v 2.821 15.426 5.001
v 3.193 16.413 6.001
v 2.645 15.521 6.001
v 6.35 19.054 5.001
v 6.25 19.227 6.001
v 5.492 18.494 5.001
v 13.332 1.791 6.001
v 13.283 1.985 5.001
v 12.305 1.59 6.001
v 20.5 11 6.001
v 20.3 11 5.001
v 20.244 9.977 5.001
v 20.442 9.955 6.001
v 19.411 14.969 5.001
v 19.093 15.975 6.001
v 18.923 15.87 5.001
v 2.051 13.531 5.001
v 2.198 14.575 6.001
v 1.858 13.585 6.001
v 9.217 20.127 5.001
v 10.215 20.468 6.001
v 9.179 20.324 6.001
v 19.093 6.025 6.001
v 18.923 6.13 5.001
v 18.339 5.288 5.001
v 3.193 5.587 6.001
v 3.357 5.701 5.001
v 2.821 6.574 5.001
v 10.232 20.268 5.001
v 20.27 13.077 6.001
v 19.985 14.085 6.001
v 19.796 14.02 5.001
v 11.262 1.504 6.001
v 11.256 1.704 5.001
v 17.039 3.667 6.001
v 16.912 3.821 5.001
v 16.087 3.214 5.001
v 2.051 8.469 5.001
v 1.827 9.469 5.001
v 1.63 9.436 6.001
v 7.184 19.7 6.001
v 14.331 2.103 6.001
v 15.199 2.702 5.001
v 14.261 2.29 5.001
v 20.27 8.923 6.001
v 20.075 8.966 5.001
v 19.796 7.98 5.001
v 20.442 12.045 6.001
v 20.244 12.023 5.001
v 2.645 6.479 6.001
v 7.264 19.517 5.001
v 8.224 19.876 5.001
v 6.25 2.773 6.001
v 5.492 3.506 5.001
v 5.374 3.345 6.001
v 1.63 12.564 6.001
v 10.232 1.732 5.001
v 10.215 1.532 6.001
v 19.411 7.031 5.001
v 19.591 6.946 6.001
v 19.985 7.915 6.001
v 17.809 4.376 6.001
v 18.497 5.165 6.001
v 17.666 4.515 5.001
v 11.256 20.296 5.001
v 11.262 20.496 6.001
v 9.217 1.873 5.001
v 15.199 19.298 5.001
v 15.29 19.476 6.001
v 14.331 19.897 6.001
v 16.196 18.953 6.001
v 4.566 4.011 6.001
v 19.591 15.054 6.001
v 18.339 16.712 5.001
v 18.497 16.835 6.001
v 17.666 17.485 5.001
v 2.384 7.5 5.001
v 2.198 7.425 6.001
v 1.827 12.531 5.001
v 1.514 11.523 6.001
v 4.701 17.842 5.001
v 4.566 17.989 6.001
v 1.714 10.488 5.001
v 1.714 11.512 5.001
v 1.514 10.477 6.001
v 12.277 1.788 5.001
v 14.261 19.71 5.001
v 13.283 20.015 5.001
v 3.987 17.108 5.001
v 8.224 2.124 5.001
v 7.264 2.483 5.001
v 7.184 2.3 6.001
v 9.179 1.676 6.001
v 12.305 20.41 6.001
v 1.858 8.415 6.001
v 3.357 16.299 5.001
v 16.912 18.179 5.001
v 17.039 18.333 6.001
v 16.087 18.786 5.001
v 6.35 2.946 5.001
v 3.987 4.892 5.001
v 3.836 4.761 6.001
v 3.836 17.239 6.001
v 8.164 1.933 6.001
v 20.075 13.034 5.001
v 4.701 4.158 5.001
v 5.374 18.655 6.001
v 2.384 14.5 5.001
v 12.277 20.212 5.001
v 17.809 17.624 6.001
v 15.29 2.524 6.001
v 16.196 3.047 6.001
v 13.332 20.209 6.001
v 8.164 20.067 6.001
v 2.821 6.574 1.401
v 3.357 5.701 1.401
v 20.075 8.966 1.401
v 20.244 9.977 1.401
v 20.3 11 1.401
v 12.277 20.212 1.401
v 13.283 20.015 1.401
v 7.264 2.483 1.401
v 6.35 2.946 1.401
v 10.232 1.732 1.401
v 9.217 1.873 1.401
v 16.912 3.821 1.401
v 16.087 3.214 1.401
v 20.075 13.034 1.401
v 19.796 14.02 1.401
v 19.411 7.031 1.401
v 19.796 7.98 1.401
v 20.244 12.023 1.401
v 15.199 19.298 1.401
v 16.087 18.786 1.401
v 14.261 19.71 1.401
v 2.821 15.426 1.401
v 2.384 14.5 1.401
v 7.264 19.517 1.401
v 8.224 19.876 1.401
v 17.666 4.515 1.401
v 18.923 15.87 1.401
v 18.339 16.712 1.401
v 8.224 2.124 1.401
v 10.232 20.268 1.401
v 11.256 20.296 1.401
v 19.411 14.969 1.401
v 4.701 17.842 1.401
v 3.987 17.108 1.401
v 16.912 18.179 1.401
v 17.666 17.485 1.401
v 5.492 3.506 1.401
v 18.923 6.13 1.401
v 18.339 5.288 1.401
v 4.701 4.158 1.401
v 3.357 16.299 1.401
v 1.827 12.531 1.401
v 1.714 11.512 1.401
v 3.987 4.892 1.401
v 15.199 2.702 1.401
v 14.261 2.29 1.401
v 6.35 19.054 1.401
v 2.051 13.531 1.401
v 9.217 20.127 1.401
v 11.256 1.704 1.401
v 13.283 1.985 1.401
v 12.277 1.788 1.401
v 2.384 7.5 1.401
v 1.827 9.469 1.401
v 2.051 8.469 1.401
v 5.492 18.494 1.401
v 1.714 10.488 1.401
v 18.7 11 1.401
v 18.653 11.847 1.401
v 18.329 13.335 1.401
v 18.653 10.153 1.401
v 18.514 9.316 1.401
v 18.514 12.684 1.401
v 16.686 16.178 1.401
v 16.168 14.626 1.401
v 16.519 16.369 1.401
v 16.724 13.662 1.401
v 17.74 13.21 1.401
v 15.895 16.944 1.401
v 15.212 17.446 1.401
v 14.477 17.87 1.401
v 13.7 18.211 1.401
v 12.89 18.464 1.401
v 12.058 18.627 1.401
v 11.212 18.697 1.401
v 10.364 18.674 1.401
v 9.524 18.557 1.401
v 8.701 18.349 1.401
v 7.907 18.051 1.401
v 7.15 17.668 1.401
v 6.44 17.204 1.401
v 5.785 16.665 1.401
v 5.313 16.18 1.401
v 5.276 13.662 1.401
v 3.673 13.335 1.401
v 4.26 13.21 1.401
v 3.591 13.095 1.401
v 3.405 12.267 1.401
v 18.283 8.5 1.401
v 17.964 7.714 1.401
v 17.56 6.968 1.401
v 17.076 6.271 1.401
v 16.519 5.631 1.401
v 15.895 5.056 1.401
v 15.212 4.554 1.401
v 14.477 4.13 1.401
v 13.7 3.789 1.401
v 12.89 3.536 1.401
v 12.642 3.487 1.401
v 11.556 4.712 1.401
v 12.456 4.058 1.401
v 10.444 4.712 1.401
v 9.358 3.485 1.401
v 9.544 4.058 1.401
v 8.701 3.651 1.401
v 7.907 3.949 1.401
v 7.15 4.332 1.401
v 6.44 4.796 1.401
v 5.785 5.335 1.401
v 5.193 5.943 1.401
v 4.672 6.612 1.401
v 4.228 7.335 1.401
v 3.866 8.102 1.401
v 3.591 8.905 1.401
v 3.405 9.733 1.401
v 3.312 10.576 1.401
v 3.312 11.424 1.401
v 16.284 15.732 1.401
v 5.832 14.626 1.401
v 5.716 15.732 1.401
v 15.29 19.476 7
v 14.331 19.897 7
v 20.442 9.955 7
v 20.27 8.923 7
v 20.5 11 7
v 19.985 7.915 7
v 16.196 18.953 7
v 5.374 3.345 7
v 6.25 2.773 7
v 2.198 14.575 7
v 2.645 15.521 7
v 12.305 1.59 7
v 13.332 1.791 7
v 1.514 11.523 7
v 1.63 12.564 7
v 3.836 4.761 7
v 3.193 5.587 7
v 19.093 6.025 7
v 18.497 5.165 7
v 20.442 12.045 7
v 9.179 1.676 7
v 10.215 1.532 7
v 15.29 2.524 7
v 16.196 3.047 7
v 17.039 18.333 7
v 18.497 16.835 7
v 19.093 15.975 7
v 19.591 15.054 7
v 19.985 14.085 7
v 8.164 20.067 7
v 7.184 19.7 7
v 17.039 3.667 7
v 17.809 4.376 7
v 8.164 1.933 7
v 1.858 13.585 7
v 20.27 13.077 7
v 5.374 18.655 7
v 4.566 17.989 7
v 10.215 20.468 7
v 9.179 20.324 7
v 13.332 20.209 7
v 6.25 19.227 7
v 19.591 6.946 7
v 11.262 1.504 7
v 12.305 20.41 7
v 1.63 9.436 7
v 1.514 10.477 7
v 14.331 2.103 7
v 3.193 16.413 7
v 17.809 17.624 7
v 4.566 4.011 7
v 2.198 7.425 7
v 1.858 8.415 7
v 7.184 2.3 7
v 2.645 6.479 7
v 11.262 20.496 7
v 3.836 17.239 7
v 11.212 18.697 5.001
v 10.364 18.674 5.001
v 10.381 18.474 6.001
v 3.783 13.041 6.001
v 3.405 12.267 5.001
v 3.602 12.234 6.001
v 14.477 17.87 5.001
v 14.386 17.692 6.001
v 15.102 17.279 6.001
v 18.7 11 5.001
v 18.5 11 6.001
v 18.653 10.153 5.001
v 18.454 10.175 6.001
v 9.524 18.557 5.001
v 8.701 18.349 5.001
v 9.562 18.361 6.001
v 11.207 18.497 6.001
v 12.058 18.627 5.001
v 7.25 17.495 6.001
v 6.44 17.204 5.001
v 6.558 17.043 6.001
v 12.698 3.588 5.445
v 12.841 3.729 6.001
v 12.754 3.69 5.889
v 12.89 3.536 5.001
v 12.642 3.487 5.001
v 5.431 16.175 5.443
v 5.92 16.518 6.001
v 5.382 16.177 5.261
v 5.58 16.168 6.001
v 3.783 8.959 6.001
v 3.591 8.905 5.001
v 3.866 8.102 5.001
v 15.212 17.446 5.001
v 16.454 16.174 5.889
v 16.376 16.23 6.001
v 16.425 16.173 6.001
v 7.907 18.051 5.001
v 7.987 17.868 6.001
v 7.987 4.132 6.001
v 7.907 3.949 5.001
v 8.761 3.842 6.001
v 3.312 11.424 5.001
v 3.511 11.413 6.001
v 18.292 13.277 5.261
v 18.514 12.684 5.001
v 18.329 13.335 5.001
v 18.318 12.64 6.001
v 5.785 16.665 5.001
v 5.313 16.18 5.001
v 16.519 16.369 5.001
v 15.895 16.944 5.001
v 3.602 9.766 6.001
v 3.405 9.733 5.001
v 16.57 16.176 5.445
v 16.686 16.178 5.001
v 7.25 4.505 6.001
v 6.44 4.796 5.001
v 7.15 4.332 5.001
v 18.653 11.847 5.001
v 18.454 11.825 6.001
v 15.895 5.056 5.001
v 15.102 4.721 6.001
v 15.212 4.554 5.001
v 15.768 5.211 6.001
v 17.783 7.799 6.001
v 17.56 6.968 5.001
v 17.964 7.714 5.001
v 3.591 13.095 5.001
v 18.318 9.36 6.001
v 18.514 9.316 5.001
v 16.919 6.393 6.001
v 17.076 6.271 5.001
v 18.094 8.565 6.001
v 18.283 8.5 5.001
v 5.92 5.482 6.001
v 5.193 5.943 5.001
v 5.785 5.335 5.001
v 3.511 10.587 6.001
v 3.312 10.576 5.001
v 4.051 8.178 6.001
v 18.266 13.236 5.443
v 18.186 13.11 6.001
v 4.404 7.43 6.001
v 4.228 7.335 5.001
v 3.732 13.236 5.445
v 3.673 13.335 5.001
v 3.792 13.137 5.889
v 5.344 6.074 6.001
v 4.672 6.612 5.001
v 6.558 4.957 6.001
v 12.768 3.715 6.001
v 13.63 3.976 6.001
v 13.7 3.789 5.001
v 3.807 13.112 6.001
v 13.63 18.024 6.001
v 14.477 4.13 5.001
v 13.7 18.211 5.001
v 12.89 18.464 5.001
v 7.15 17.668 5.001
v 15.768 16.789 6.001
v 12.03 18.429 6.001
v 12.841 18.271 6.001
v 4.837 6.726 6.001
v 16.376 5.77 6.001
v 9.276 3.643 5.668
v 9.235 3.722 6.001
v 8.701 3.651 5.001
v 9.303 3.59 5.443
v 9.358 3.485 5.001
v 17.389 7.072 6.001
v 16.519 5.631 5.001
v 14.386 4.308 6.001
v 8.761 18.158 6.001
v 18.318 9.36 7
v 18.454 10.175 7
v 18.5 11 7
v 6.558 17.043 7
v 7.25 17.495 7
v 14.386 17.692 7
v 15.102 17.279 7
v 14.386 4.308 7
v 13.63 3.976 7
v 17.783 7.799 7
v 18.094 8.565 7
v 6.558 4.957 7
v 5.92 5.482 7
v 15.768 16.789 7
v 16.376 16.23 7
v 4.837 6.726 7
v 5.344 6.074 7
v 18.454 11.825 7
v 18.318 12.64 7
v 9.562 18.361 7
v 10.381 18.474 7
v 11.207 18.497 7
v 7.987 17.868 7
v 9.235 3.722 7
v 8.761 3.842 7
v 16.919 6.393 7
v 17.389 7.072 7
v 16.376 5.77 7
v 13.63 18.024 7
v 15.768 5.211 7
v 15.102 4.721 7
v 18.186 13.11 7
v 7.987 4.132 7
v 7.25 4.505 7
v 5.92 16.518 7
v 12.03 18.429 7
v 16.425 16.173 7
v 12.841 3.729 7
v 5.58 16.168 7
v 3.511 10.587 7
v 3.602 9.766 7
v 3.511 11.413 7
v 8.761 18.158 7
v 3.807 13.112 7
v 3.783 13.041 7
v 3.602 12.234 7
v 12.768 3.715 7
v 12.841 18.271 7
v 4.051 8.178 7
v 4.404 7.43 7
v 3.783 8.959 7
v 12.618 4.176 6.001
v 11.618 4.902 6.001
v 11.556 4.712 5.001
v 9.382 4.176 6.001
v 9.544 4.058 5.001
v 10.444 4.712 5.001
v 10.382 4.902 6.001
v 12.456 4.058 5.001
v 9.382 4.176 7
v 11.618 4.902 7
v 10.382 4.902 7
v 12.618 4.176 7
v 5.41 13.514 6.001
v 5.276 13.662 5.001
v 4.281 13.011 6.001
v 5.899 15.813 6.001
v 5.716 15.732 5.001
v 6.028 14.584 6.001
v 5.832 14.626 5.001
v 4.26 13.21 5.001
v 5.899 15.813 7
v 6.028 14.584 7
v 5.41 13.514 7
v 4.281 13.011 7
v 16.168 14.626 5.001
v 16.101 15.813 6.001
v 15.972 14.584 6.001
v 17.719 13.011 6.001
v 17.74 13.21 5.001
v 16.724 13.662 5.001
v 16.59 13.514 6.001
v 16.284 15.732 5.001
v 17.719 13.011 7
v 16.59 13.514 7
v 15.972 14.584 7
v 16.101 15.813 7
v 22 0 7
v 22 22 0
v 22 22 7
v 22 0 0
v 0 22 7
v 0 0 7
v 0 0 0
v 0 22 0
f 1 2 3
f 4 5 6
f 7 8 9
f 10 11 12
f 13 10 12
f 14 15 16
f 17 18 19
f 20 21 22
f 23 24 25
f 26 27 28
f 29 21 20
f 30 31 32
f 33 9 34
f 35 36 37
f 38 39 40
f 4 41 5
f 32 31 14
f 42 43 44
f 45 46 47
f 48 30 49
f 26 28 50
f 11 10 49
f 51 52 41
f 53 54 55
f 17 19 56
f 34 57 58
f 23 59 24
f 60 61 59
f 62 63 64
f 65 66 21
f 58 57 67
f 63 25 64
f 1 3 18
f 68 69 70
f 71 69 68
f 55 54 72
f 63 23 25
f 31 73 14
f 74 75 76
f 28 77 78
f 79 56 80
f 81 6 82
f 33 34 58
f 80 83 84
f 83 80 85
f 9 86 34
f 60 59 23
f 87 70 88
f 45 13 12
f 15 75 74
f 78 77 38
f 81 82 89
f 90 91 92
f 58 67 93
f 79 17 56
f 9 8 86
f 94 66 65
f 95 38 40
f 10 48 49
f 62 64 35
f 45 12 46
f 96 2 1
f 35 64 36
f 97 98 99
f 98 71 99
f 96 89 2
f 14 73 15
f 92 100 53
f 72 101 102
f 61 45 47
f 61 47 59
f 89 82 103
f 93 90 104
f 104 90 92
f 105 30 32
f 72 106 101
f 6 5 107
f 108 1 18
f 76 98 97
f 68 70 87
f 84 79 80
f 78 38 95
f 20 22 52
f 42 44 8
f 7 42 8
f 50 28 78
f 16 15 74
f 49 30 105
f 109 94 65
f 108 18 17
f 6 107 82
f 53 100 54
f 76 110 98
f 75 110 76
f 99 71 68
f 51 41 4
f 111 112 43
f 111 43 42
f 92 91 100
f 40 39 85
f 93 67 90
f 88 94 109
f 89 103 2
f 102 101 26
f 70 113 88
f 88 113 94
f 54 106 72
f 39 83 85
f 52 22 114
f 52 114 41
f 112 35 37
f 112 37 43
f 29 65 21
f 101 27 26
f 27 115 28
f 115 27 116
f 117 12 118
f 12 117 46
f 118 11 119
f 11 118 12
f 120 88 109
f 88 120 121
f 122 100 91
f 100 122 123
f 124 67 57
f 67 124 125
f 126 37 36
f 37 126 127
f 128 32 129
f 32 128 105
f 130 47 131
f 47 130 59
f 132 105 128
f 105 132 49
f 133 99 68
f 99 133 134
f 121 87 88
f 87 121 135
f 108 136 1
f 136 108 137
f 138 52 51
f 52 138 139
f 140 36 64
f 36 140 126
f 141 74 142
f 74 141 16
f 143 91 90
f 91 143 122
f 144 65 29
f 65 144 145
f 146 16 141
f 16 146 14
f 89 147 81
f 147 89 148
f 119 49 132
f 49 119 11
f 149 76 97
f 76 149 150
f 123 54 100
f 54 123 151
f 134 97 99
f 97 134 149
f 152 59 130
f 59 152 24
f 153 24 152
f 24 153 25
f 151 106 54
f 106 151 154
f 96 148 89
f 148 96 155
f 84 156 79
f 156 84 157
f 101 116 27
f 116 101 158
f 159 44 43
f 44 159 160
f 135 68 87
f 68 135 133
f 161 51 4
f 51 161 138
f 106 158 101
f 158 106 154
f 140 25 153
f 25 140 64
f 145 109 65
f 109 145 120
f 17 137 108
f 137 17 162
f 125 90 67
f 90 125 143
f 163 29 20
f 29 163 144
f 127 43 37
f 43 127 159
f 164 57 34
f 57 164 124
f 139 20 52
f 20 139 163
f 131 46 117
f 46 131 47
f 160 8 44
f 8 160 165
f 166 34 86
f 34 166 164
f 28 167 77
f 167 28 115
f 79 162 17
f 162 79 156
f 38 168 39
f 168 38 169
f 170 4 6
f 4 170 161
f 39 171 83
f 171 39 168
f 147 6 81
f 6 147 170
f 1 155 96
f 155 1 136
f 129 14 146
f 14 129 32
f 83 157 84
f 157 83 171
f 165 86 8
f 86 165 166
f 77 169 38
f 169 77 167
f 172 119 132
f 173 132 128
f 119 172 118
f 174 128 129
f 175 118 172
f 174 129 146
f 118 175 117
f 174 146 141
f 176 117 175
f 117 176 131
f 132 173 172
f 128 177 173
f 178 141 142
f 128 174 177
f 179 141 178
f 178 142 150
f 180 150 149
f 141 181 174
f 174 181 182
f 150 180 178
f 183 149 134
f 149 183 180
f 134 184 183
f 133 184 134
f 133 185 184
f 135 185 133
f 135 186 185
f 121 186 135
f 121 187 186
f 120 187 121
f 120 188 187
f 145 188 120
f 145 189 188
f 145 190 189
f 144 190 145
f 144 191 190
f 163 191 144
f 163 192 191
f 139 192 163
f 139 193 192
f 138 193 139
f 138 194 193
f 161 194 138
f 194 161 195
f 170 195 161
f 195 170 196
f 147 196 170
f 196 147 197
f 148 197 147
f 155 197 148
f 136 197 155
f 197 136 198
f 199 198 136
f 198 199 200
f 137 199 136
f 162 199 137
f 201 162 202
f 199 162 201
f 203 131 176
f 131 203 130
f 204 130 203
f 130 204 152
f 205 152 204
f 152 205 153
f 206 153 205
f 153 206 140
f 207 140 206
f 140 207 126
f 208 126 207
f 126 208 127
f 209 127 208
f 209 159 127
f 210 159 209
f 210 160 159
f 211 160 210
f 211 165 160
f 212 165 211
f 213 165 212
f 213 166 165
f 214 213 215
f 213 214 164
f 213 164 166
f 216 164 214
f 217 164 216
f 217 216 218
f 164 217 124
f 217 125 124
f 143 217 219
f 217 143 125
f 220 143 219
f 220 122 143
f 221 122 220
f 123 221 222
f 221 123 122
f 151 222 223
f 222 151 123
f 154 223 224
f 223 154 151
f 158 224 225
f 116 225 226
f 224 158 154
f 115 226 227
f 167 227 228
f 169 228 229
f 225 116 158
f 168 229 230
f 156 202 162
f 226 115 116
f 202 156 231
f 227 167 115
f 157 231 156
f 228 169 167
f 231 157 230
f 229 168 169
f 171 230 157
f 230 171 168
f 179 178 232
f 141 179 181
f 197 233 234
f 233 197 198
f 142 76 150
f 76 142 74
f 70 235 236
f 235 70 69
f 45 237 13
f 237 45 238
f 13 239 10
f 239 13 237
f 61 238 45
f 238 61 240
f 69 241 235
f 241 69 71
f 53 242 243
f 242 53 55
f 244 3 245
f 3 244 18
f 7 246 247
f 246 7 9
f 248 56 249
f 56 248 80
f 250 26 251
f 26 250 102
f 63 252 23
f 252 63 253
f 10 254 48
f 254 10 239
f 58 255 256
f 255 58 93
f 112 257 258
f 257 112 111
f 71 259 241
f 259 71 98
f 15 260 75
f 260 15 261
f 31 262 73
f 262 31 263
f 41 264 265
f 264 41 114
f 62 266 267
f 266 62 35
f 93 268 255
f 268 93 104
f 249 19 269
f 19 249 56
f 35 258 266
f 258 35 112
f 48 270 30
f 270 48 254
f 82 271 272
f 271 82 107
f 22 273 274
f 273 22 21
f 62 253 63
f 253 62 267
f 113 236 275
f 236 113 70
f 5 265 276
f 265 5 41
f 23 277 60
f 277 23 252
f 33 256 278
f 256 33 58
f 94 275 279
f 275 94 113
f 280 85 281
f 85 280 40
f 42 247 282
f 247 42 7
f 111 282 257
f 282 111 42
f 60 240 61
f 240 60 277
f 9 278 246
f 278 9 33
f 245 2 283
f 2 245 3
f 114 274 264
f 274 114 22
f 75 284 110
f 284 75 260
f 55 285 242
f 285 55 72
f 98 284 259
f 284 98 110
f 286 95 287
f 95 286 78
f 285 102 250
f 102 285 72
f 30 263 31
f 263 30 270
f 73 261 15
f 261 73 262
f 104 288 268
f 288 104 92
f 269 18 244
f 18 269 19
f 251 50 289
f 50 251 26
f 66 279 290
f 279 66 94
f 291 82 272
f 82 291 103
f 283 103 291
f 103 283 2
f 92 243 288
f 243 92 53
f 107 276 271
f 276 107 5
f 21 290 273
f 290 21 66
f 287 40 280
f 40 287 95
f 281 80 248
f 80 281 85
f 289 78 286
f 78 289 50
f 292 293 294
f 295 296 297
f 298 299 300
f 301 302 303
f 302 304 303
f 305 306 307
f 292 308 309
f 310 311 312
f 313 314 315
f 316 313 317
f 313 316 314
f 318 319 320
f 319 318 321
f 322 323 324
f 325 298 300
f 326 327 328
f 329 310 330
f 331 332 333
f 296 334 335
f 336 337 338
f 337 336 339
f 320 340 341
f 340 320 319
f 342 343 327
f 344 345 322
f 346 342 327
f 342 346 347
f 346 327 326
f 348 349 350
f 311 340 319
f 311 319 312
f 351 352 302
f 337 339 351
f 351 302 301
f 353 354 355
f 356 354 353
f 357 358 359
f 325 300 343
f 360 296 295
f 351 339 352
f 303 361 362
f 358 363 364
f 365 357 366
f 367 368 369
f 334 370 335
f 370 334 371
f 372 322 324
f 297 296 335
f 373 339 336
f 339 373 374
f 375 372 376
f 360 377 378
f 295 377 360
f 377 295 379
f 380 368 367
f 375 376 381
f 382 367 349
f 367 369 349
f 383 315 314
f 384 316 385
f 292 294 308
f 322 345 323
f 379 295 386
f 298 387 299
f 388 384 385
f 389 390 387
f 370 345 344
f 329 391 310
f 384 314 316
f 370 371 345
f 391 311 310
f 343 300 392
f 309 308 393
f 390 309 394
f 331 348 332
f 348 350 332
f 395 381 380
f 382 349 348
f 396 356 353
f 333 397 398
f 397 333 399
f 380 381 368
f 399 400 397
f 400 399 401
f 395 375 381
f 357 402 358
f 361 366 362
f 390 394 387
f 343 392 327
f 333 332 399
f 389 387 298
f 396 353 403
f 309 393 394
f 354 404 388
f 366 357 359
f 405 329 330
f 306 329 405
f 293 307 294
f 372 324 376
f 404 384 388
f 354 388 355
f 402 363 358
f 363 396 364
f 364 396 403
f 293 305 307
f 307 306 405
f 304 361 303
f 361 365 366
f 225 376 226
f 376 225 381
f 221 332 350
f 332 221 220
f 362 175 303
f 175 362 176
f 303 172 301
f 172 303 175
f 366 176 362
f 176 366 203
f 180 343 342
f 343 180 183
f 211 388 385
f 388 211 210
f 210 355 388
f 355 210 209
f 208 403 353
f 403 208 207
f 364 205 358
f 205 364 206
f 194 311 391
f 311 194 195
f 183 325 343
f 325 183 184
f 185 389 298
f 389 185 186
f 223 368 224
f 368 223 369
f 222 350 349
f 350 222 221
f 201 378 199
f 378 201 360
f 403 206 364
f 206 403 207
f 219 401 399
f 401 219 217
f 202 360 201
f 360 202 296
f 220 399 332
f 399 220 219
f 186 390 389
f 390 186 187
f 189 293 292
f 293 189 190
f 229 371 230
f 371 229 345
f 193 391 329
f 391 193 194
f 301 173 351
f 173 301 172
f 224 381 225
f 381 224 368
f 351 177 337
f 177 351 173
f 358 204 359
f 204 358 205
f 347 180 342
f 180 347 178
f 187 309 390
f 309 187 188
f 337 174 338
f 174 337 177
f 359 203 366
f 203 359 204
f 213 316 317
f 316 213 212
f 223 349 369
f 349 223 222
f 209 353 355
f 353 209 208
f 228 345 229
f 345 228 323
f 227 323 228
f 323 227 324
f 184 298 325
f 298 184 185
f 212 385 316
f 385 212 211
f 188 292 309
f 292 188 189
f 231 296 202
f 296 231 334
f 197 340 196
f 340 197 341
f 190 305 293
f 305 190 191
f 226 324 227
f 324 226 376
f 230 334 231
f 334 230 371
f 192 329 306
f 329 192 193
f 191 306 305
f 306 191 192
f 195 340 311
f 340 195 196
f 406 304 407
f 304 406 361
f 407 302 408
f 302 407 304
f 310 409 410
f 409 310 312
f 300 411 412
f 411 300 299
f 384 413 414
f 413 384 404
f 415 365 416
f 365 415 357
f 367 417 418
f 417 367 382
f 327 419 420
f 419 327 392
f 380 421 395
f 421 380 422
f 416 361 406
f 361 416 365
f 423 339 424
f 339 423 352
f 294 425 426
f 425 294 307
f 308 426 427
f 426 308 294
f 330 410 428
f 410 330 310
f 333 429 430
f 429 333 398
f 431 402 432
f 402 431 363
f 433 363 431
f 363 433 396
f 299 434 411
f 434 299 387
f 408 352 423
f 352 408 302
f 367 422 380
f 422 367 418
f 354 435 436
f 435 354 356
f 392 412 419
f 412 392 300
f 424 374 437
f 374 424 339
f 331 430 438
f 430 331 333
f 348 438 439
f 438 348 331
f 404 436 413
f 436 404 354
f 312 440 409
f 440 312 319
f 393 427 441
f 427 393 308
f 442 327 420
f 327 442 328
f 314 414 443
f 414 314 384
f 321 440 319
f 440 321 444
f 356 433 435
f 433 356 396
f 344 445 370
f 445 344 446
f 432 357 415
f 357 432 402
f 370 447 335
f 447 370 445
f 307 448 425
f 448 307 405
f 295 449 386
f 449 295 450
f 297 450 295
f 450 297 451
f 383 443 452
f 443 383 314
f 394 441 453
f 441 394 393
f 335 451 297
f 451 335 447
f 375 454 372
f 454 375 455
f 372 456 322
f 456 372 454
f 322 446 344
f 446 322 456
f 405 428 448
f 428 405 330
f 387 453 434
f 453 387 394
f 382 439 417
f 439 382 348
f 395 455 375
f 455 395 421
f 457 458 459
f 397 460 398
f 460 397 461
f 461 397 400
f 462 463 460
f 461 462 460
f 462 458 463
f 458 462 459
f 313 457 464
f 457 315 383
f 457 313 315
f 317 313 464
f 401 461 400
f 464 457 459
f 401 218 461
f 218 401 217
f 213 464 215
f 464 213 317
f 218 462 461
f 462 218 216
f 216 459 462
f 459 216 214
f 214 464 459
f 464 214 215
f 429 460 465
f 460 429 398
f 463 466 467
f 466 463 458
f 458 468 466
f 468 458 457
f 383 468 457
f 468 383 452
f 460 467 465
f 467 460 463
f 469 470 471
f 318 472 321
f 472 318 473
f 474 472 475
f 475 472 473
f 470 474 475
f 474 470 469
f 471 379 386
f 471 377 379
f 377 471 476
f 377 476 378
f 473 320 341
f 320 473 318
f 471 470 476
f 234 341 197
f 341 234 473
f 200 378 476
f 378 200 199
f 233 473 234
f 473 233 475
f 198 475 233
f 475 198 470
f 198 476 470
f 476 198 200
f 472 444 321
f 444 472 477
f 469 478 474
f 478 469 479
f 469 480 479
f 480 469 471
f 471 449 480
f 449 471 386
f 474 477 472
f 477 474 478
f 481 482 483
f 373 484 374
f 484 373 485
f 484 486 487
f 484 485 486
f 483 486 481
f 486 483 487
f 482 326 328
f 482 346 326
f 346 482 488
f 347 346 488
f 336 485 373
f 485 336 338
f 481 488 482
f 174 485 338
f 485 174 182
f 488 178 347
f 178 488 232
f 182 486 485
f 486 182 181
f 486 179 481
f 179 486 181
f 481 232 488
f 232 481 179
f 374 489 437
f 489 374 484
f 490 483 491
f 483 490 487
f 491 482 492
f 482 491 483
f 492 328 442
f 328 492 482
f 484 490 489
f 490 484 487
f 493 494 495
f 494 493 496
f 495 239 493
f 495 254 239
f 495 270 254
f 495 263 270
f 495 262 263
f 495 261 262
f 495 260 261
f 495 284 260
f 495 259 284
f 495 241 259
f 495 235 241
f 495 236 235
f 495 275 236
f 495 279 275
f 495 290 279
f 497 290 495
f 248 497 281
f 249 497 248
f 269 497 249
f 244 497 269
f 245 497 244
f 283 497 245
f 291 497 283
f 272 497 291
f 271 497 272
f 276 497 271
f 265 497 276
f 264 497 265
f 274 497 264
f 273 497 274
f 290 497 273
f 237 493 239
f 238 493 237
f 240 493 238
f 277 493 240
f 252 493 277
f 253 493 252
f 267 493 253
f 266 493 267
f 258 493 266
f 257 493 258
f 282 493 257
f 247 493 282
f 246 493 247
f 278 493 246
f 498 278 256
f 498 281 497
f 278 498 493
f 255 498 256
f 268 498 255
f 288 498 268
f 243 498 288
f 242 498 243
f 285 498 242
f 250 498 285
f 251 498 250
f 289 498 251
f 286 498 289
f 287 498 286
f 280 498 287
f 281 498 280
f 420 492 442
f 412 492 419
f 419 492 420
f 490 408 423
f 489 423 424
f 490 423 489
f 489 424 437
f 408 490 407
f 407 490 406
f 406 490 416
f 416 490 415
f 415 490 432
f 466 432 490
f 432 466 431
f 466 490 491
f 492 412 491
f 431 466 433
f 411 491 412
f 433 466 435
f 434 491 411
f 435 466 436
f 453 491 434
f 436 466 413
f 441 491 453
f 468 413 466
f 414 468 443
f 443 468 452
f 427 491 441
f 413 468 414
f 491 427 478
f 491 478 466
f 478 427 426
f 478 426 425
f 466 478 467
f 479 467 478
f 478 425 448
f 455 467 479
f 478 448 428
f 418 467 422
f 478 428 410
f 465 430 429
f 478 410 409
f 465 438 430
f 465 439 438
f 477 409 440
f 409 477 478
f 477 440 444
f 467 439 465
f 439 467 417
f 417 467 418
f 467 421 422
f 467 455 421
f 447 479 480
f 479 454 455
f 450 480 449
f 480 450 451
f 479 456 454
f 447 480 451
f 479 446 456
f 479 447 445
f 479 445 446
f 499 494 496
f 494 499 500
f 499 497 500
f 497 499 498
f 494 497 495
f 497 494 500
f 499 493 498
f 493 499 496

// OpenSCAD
// file: constants.scad
connectors_notched_circle_thickness = 2;
connectors_notched_circle_notch_diameter = 3;
connectors_notched_circle_loose_length = 1;
connectors_notched_circle_loose_to_tight_length = 1;
// file: ../../utilities/cylinders.scad
// Calculates the $fn which should be used for a cylinder of a specific size.
function cylinder_sides(
  // The diameter of the cylinder.
  diameter
) = ceil(
  max(
    min(
      360 / $fa,
      diameter * PI / $fs
    ),
    8
  )
);

// Generates a grid of square perforations through a cylinder of a specific
// size.
module cylinder_perforations(
  // The diameter of the cylinder.
  diameter,
  // The height of the cylinder.
  length,
  // The size (width/height) of each perforation.
  perforation_size,
  // The target spacing between perforations.  This will be adjusted to fit
  // evenly on the cylinder.
  perforation_spacing
) {
  half_perimeter = diameter * PI / 2;
  angularPerforations = round(half_perimeter / perforation_spacing);
  zPerforations = round(half_perimeter / perforation_spacing);
  for (angle = [0:180 / angularPerforations:180]) {
    rotate([0, 0, angle]) {
      for (z = [perforation_spacing:perforation_spacing:length - perforation_spacing]) {
        translate([0, 0, z]) {
          cube([diameter, perforation_size, perforation_size], center = true);
        };
      }
    };
  };
};

// Generates a "pipe" which lofts a sequence of circles together.
module cylinder_sequence(
  // The diameter of the first circle.
  initial_diameter,
  // An array of arrays, where each child array is two numbers:
  // - The length of the segment along Z.
  // - The diameter of the end of the segment.
  length_diameter_pairs,
  // The number of sides of all circles drawn.
  sides,
  // Used for recursion; leave as default.
  i = 0
) {
  if (i < len(length_diameter_pairs)) {
    cylinder(
      d1 = initial_diameter,
      d2 = length_diameter_pairs[i][1],
      h = length_diameter_pairs[i][0],
      $fn = sides
    );
    translate([
      0,
      0,
      length_diameter_pairs[i][0]
    ]) {
      cylinder_sequence(
        length_diameter_pairs[i][1],
        length_diameter_pairs,
        sides,
        i + 1
      );
    };
  };
};
// file: female.scad
include <../../settings.scad>;
use <../../utilities/cylinders.scad>;
include <constants.scad>;

// Renders the female counterpart of a circular connector with a number of
// orienting notches.  Place on the surface oriented so that Z- is the surface
// normal.
module connectors_notched_circle_female(
    // The outer diameter of the compatible male circle.
    diameter,
    // The length of the male compatible circle.
    length,
    // The number of notches, spaced evenly.
    notches
) {
  outer_circle_diameter_loose = diameter + loose_tolerance;
  outer_circle_diameter_tight = diameter + tight_tolerance;
  inner_circle_diameter_loose = diameter - connectors_notched_circle_thickness - loose_tolerance;
  inner_circle_diameter_tight = diameter - connectors_notched_circle_thickness - tight_tolerance;
  notch_diameter_loose = connectors_notched_circle_notch_diameter + loose_tolerance;
  notch_diameter_tight = connectors_notched_circle_notch_diameter + tight_tolerance;
  final_circle_length = length + tight_tolerance - connectors_notched_circle_loose_length - connectors_notched_circle_loose_to_tight_length;
  union() {
    difference() {
      // The outer circle.
      cylinder_sequence(
        outer_circle_diameter_loose,
        [
          [
            connectors_notched_circle_loose_length,
            outer_circle_diameter_loose
          ],
          [
            connectors_notched_circle_loose_to_tight_length,
            outer_circle_diameter_tight
          ],
          [
            final_circle_length,
            outer_circle_diameter_tight
          ],
        ],
        cylinder_sides(diameter)
      );

      // The inner circle.
      cylinder_sequence(
        inner_circle_diameter_loose,
        [
          [
            connectors_notched_circle_loose_length,
            inner_circle_diameter_loose
          ],
          [
            connectors_notched_circle_loose_to_tight_length,
            inner_circle_diameter_tight
          ],
          [
            final_circle_length,
            inner_circle_diameter_tight
          ],
        ],
        cylinder_sides(diameter)
      );
    };

    intersection() {
      // The notch.
      for (notch = [0:notches - 1]) {
        rotate([0, 0, notch * 360 / notches]) {
          translate([
            0,
            diameter / 2 - connectors_notched_circle_thickness / 2,
            0
          ]) {
            cylinder_sequence(
              notch_diameter_loose,
              [
                [
                  connectors_notched_circle_loose_length,
                  notch_diameter_loose
                ],
                [
                  connectors_notched_circle_loose_to_tight_length,
                  notch_diameter_tight
                ],
                [
                  final_circle_length,
                  notch_diameter_tight
                ],
              ],
              cylinder_sides(connectors_notched_circle_notch_diameter)
            );
          };
        };
      };

      // Ensure that the notch does not escape the outer circle.
      cylinder_sequence(
        outer_circle_diameter_loose,
        [
          [
            connectors_notched_circle_loose_length,
            outer_circle_diameter_loose
          ],
          [
            connectors_notched_circle_loose_to_tight_length,
            outer_circle_diameter_tight
          ],
          [
            final_circle_length,
            outer_circle_diameter_tight
          ],
        ],
        cylinder_sides(diameter)
      );
    };
  };
};
// file: ../../settings.scad
// When true, lower resolution primitives will be used.
draft = false;

$fs = draft ? 2 : 1;
$fa = draft ? 12 : 6;

// The amount of space left between parts which must fit together tightly.
tight_tolerance = 0.6;

// The amount of space left between parts which must fit together loosely.
loose_tolerance = 1;
// main file
include <../../settings.scad>;
use <female.scad>;

difference() {
  cube([22, 22, 7]);

  translate([11, 11, 7.001]) {
    rotate([180, 0, 0]) {
      connectors_notched_circle_female(18, 5, 3);
    }
  };
};
